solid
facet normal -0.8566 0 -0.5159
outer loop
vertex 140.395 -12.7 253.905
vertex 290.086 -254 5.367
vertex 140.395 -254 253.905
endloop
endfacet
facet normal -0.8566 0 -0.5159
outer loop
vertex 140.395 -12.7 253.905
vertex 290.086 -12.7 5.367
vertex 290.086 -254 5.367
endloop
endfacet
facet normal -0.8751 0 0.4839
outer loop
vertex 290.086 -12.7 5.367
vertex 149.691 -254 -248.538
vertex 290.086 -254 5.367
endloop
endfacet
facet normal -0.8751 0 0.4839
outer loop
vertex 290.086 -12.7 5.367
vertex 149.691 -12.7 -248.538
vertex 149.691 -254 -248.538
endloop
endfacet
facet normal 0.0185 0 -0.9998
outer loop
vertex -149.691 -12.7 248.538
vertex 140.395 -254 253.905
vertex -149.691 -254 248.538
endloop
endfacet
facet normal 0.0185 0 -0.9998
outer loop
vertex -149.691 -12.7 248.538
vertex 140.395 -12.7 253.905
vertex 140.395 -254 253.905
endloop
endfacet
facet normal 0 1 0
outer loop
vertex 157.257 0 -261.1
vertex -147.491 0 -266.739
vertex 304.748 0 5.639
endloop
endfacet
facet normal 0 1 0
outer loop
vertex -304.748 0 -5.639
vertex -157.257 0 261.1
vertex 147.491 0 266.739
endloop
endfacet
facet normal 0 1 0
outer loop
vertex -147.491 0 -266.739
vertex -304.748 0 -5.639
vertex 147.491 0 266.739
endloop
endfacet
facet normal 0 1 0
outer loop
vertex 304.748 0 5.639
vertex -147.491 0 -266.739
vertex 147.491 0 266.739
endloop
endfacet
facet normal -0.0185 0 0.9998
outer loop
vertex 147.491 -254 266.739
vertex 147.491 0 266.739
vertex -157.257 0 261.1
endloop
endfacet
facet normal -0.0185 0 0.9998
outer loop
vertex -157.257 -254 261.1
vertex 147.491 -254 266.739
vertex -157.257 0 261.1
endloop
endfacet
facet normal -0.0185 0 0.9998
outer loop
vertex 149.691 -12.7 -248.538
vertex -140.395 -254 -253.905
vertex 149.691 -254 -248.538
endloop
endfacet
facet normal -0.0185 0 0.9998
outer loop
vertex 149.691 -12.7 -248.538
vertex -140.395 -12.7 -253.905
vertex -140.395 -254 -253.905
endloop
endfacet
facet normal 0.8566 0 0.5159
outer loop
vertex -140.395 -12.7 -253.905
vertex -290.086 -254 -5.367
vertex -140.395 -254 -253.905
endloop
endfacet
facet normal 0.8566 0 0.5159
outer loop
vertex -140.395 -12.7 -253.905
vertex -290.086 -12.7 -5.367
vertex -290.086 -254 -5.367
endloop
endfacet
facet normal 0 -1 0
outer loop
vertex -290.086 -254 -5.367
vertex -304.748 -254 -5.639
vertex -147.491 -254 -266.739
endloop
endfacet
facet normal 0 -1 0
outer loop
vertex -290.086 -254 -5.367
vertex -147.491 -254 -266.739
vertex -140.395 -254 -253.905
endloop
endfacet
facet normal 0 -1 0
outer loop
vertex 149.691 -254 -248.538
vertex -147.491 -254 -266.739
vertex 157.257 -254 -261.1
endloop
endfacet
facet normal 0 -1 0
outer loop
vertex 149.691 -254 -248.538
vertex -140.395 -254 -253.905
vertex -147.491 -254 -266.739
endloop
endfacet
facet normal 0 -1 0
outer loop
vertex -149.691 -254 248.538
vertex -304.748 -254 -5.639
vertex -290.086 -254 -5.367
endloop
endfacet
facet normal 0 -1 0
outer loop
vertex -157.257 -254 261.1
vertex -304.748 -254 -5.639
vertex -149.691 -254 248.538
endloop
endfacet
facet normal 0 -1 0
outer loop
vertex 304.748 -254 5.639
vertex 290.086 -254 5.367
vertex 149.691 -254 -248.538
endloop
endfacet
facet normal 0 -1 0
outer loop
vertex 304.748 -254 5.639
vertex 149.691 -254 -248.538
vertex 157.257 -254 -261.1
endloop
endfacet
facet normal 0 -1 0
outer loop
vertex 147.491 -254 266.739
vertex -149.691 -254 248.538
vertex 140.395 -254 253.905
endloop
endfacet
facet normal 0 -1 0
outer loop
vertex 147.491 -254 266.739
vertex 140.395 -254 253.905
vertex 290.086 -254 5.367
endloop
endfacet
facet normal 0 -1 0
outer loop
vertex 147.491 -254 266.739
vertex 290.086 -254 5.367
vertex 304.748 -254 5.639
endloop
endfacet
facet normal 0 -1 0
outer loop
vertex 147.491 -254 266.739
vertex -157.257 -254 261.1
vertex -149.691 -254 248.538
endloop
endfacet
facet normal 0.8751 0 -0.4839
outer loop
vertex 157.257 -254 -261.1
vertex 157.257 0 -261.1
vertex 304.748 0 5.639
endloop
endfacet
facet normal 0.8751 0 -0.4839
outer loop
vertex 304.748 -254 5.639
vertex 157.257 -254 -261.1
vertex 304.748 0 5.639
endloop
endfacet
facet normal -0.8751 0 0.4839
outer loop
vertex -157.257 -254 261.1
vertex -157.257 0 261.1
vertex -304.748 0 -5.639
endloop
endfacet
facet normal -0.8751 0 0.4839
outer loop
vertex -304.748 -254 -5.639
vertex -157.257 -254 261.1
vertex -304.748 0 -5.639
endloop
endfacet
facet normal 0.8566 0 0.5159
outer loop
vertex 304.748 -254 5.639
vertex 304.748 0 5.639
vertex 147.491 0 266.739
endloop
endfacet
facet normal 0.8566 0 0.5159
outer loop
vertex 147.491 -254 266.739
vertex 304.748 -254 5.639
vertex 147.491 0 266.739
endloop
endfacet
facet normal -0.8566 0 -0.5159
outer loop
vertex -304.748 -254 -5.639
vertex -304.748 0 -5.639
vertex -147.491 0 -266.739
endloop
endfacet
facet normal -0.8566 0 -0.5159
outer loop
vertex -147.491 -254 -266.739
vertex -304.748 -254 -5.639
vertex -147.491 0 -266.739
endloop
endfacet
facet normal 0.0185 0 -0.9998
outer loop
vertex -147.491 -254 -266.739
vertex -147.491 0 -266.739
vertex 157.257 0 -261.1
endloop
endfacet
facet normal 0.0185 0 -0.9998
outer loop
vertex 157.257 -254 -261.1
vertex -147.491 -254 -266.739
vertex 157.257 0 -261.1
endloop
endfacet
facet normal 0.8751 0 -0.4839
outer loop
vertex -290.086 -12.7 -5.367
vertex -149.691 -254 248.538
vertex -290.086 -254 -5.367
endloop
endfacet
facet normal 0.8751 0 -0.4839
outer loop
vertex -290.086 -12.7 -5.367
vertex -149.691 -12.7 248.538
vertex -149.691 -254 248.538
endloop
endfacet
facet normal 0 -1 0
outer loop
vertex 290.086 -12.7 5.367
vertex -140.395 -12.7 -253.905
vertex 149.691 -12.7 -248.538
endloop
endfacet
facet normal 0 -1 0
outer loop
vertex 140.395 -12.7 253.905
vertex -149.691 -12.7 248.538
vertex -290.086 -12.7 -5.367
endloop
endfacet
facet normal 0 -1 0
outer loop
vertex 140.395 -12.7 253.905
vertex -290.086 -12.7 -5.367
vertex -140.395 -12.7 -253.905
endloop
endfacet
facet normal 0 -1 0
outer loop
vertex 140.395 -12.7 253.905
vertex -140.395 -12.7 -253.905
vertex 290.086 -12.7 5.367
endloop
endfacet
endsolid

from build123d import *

# Parameters (mm, degrees)
F1_DEPTH = 254
F2_T     = -12.7


with BuildPart() as f1:
    # F0 (on Front) → F1 (new body)
    with BuildSketch(Plane.XZ):
        Polygon((-157.257091, 261.100072), (-304.74784, -5.6386), (-147.490749, -266.738671), (157.257091, -261.100072), (304.74784, 5.6386), (147.490749, 266.738671), align=None)
    extrude(amount=F1_DEPTH)

    # F2
    f2_openings = [f1.faces().sort_by_distance(p)[0] for p in [
        (0, -254, 0),
    ]]
    offset(amount=F2_T, openings=f2_openings)


with BuildPart() as f3_1:
    # F3: copy of F1
    add(f1.part.moved(Location((557.77382, 0, 309.68302))))


solid = f1.part
